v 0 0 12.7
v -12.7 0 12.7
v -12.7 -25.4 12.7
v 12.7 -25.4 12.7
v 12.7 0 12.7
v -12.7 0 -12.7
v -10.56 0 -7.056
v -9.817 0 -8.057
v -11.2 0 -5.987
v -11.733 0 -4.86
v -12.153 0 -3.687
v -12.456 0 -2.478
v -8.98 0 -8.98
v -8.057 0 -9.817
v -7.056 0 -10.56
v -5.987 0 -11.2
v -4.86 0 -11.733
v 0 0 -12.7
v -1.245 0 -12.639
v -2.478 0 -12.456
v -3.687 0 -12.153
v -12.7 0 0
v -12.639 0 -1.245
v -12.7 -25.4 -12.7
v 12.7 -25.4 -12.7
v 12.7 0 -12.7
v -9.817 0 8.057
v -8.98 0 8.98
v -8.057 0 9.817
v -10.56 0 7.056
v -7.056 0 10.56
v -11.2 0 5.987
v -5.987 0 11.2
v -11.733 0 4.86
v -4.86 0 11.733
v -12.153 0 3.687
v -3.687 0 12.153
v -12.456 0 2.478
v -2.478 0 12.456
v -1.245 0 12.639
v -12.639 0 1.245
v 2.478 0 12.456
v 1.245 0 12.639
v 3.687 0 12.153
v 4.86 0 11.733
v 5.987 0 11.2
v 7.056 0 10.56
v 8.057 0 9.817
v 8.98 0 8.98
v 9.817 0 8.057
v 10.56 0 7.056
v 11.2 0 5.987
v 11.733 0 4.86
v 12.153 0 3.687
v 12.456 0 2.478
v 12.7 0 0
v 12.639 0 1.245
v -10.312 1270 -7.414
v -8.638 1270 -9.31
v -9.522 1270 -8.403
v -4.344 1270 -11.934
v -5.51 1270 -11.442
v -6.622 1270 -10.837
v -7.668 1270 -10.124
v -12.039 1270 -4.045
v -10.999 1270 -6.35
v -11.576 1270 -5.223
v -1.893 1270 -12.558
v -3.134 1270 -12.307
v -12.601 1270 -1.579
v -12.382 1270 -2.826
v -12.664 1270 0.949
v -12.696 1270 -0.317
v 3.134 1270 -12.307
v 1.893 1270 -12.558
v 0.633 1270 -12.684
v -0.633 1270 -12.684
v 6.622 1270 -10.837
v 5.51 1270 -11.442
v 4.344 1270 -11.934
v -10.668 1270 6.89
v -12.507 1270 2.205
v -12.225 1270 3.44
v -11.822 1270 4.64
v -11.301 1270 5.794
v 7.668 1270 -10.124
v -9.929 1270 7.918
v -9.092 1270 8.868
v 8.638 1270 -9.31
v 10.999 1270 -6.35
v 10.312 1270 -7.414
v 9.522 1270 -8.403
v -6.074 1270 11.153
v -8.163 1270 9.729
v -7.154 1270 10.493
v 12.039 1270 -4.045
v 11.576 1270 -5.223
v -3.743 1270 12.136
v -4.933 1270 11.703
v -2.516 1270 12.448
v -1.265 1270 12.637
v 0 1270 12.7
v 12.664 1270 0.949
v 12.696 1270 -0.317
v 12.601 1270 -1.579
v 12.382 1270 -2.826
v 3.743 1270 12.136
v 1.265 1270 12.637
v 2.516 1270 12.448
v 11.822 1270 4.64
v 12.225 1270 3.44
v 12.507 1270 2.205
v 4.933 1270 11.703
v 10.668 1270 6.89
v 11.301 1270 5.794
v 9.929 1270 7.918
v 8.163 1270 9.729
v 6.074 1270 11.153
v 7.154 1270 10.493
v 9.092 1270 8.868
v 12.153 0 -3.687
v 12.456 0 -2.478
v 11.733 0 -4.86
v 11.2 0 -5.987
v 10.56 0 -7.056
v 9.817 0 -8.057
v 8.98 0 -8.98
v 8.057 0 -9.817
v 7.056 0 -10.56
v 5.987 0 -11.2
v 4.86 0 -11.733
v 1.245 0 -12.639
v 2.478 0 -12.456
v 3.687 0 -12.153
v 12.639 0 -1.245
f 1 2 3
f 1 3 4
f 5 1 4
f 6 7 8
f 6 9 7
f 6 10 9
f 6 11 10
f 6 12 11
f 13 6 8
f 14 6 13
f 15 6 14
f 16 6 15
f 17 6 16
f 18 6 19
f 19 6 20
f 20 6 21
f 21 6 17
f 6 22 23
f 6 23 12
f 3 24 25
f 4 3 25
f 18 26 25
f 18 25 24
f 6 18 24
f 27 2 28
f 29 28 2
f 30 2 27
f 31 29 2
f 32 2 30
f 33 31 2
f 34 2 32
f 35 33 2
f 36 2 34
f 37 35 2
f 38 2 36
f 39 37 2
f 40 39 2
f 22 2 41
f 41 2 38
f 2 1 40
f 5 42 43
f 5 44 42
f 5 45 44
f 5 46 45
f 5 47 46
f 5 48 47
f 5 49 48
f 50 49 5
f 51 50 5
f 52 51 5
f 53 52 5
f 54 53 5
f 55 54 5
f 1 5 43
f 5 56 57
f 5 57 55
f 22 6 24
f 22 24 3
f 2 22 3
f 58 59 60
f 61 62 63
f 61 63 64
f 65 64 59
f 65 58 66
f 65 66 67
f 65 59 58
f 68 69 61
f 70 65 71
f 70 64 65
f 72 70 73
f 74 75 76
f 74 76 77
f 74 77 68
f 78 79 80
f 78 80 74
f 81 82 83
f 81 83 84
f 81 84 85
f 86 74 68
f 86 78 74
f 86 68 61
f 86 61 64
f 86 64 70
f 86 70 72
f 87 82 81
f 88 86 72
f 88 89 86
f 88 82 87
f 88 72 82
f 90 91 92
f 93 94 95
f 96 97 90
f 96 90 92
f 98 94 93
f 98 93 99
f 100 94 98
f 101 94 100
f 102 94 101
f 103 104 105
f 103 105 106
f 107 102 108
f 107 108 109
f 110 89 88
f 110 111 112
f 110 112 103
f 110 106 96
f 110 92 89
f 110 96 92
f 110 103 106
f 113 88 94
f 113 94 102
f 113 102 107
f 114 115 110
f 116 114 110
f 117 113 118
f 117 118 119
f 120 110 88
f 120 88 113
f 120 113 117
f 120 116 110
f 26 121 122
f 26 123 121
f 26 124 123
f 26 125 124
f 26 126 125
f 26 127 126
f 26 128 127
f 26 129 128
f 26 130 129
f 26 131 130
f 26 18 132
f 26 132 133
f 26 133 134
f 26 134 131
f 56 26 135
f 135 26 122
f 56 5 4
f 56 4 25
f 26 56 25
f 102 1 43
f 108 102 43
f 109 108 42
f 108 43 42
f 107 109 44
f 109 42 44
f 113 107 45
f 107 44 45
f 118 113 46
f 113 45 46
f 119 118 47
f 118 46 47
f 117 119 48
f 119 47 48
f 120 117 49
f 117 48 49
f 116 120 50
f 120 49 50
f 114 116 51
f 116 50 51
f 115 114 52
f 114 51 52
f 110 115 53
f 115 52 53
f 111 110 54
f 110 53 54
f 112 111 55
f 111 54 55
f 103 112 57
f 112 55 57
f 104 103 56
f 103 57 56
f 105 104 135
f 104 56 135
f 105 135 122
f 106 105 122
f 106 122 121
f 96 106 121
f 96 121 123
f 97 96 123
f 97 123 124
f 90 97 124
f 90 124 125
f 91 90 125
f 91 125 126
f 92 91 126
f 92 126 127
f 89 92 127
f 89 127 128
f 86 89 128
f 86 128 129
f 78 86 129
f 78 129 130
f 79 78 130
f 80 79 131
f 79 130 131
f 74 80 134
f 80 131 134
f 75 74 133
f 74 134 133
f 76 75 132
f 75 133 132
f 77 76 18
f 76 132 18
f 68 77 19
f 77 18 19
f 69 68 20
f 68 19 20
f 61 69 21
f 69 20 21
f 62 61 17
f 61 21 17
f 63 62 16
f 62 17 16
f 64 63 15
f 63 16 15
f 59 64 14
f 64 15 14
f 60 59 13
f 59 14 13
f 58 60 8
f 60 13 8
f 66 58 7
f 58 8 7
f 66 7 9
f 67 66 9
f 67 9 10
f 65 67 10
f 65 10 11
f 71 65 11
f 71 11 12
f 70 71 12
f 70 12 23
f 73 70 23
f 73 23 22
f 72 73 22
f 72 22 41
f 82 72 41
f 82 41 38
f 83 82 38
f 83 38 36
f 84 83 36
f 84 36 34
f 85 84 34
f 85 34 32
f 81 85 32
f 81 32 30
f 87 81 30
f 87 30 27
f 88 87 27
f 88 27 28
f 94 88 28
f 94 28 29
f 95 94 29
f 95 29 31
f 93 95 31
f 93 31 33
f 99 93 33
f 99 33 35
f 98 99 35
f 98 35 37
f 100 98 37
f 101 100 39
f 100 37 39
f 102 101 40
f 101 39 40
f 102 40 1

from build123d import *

# Parameters (mm, degrees)
SKETCH1_W           = 25.4
SKETCH1_H           = 25.4
BOSS_EXTRUDE1_DEPTH = 25.4
BOSS_EXTRUDE2_DEPTH = 1270


with BuildPart() as part:
    # Sketch1 → Boss-Extrude1 (new body)
    with BuildSketch(Plane(origin=(0, 0, 0), x_dir=(1, 0, 0), z_dir=(0, 1, 0))):
        Rectangle(SKETCH1_W, SKETCH1_H)
    extrude(amount=-BOSS_EXTRUDE1_DEPTH)

    # Sketch1<3> → Boss-Extrude2 (add)
    with BuildSketch(Plane(origin=(0, 0, 0), x_dir=(1, 0, 0), z_dir=(0, 1, 0))):
        with BuildLine():
            ThreePointArc((12.7, 0), (8.980256121, 8.980256121), (0, 12.7))
            ThreePointArc((0, 12.7), (-8.980256132, 8.98025611), (-12.7, -3e-08))
            ThreePointArc((-12.7, -3e-08), (-8.98025611, -8.980256132), (0, -12.7))
            ThreePointArc((0, -12.7), (8.980256121, -8.980256121), (12.7, 0))
        make_face()
    extrude(amount=BOSS_EXTRUDE2_DEPTH)


solid = part.part
